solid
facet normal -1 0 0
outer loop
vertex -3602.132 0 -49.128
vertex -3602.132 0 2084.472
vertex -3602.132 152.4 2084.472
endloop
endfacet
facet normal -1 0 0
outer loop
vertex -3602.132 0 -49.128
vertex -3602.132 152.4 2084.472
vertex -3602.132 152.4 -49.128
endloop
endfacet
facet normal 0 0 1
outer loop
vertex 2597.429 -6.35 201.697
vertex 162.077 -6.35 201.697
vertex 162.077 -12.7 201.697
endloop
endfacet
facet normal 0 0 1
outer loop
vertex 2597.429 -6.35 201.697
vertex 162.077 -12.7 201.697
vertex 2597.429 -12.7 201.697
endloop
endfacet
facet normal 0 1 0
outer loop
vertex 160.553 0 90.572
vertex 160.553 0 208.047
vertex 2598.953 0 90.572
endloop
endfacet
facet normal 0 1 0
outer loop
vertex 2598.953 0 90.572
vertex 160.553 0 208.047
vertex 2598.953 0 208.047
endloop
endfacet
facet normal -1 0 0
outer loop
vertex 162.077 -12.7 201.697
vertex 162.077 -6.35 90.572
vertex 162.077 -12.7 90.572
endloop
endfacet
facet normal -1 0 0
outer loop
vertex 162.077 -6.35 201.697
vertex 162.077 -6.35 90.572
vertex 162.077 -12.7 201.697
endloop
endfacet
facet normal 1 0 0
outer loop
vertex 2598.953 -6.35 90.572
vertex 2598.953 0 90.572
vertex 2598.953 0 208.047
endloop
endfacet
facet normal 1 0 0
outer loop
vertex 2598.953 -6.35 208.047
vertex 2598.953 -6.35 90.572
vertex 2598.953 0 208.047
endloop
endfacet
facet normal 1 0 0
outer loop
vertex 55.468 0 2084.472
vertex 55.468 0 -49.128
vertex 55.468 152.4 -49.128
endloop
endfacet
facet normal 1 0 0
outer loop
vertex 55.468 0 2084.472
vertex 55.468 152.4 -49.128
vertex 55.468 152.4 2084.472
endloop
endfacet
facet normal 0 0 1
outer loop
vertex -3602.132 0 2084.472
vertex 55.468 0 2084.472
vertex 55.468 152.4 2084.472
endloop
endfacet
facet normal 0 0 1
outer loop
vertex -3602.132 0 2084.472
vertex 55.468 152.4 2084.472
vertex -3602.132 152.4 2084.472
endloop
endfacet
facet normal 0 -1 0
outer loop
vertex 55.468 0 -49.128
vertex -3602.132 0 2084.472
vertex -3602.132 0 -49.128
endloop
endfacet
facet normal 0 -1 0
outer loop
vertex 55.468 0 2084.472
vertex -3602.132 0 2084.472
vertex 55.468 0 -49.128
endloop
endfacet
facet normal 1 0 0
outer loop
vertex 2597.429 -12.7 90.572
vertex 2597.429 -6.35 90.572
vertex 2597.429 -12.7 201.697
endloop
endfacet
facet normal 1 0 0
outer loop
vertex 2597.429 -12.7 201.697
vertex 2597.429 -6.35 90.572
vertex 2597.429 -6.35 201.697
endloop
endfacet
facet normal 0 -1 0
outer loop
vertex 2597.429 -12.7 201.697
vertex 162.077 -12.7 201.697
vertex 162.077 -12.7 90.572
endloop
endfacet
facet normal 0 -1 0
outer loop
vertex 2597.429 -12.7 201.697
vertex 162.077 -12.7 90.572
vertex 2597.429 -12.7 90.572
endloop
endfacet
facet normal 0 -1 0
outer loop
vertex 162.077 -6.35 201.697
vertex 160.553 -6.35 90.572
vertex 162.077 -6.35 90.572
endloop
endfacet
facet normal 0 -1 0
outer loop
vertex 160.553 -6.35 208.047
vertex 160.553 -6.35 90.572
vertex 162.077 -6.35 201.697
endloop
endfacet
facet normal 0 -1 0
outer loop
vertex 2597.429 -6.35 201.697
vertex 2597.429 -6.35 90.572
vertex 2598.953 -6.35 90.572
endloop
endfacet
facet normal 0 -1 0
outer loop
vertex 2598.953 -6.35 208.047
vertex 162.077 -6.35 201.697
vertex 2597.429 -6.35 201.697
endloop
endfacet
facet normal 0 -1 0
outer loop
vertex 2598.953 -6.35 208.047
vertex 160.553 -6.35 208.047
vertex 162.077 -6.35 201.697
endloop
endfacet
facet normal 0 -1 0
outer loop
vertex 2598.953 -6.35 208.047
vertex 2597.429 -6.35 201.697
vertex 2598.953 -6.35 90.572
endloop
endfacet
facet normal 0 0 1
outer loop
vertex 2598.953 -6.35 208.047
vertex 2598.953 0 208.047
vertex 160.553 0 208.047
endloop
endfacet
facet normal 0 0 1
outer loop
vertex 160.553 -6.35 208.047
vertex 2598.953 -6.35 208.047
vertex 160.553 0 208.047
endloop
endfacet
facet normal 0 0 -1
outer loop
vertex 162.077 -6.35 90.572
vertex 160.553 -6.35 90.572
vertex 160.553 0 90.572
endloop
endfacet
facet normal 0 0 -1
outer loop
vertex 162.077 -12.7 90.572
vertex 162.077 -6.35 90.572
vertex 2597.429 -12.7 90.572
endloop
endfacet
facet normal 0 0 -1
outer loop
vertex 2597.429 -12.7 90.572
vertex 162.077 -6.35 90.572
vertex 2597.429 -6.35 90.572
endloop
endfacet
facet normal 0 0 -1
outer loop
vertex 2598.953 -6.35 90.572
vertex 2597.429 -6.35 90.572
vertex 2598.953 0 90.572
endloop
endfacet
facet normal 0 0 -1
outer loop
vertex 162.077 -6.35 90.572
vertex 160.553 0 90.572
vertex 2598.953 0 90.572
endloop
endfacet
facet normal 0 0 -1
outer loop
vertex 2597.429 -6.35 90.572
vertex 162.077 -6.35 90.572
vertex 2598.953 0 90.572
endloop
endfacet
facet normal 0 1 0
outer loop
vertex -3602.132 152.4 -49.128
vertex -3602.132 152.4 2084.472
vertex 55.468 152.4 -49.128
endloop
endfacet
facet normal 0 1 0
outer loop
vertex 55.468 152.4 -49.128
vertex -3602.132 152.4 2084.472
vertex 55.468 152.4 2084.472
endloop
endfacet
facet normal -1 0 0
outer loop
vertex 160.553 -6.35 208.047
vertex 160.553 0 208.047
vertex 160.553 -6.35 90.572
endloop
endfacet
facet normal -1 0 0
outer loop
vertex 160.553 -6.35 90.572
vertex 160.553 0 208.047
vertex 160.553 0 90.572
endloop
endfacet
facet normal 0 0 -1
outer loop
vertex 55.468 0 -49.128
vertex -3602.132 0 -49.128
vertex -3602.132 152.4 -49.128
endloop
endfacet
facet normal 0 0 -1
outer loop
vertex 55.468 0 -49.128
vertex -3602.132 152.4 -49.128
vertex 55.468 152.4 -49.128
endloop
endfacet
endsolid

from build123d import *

# Parameters (mm, degrees)
F0_W     = 2435.352
F0_H     = 111.125
F1_DEPTH = 12.7
F2_DEPTH = 6.35
F0_W_2   = 791.4916503787
F0_H_2   = 117.475
F3_DEPTH = 152.4


with BuildPart() as f1:
    # F0 (on Front) → F1 (new body)
    with BuildSketch(Plane.XZ):
        with Locations((1379.7529487133, 146.1342022836)):
            Rectangle(F0_W, F0_H)
    extrude(amount=F1_DEPTH)

    # F0 (on Front) → F2 (join)
    with BuildSketch(Plane.XZ):
        Polygon((160.5529487133, 201.6967022836), (160.5529487133, 90.5717022836), (162.0769487133, 90.5717022836), (162.0769487133, 201.6967022836), (2597.4289487133, 201.6967022836), (2597.4289487133, 90.5717022836), (2598.9529487133, 90.5717022836), (2598.9529487133, 201.6967022836), (2598.9529487133, 208.0467022836), (423.7732585907, 208.0467022836), (162.0769487133, 208.0467022836), (160.5529487133, 208.0467022836), align=None)
    extrude(amount=F2_DEPTH)


with BuildPart() as f3:
    # F0 (on Front) → F3 (new body)
    with BuildSketch(Plane.XZ):
        Polygon((55.4681941867, 2084.4717022836), (-3602.1318058133, 2084.4717022836), (-3602.1318058133, 90.5717022836), (-736.023456192, 90.5717022836), (-736.023456192, 208.0467022836), (-2014.6267414093, 208.0467022836), (-2014.6267414093, 325.5217022836), (-2481.4939498901, 325.5217022836), (-2481.4939498901, 442.9967022836), (-3233.325958252, 442.9967022836), (-3233.325958252, 560.4717022836), (-1497.863650322, 560.4717022836), (-1497.863650322, 677.9467022836), (55.4681941867, 677.9467022836), align=None)
        Polygon((55.4681941867, 560.4717022836), (55.4681941867, 677.9467022836), (-1497.863650322, 677.9467022836), (-1497.863650322, 560.4717022836), (-794.925958252, 560.4717022836), align=None)
        Polygon((55.4681941867, 325.5217022836), (55.4681941867, 560.4717022836), (-794.925958252, 560.4717022836), (-794.925958252, 442.9967022836), (-43.0939498901, 442.9967022836), (-43.0939498901, 325.5217022836), align=None)
        Polygon((-794.925958252, 442.9967022836), (-794.925958252, 560.4717022836), (-1497.863650322, 560.4717022836), (-3233.325958252, 560.4717022836), (-3233.325958252, 442.9967022836), (-2481.4939498901, 442.9967022836), align=None)
        Polygon((-2014.6267414093, 325.5217022836), (-43.0939498901, 325.5217022836), (-43.0939498901, 442.9967022836), (-794.925958252, 442.9967022836), (-2481.4939498901, 442.9967022836), (-2481.4939498901, 325.5217022836), align=None)
        Polygon((-2014.6267414093, 208.0467022836), (-736.023456192, 208.0467022836), (55.4681941867, 208.0467022836), (55.4681941867, 325.5217022836), (-43.0939498901, 325.5217022836), (-2014.6267414093, 325.5217022836), align=None)
        with Locations((-340.2776310027, 149.3092022836)):
            Rectangle(F0_W_2, F0_H_2)
        Polygon((-736.023456192, 90.5717022836), (-3602.1318058133, 90.5717022836), (-3602.1318058133, -49.1282977164), (55.4681941867, -49.1282977164), (55.4681941867, 90.5717022836), align=None)
    extrude(amount=-F3_DEPTH)


solid = Compound([f1.part, f3.part])
